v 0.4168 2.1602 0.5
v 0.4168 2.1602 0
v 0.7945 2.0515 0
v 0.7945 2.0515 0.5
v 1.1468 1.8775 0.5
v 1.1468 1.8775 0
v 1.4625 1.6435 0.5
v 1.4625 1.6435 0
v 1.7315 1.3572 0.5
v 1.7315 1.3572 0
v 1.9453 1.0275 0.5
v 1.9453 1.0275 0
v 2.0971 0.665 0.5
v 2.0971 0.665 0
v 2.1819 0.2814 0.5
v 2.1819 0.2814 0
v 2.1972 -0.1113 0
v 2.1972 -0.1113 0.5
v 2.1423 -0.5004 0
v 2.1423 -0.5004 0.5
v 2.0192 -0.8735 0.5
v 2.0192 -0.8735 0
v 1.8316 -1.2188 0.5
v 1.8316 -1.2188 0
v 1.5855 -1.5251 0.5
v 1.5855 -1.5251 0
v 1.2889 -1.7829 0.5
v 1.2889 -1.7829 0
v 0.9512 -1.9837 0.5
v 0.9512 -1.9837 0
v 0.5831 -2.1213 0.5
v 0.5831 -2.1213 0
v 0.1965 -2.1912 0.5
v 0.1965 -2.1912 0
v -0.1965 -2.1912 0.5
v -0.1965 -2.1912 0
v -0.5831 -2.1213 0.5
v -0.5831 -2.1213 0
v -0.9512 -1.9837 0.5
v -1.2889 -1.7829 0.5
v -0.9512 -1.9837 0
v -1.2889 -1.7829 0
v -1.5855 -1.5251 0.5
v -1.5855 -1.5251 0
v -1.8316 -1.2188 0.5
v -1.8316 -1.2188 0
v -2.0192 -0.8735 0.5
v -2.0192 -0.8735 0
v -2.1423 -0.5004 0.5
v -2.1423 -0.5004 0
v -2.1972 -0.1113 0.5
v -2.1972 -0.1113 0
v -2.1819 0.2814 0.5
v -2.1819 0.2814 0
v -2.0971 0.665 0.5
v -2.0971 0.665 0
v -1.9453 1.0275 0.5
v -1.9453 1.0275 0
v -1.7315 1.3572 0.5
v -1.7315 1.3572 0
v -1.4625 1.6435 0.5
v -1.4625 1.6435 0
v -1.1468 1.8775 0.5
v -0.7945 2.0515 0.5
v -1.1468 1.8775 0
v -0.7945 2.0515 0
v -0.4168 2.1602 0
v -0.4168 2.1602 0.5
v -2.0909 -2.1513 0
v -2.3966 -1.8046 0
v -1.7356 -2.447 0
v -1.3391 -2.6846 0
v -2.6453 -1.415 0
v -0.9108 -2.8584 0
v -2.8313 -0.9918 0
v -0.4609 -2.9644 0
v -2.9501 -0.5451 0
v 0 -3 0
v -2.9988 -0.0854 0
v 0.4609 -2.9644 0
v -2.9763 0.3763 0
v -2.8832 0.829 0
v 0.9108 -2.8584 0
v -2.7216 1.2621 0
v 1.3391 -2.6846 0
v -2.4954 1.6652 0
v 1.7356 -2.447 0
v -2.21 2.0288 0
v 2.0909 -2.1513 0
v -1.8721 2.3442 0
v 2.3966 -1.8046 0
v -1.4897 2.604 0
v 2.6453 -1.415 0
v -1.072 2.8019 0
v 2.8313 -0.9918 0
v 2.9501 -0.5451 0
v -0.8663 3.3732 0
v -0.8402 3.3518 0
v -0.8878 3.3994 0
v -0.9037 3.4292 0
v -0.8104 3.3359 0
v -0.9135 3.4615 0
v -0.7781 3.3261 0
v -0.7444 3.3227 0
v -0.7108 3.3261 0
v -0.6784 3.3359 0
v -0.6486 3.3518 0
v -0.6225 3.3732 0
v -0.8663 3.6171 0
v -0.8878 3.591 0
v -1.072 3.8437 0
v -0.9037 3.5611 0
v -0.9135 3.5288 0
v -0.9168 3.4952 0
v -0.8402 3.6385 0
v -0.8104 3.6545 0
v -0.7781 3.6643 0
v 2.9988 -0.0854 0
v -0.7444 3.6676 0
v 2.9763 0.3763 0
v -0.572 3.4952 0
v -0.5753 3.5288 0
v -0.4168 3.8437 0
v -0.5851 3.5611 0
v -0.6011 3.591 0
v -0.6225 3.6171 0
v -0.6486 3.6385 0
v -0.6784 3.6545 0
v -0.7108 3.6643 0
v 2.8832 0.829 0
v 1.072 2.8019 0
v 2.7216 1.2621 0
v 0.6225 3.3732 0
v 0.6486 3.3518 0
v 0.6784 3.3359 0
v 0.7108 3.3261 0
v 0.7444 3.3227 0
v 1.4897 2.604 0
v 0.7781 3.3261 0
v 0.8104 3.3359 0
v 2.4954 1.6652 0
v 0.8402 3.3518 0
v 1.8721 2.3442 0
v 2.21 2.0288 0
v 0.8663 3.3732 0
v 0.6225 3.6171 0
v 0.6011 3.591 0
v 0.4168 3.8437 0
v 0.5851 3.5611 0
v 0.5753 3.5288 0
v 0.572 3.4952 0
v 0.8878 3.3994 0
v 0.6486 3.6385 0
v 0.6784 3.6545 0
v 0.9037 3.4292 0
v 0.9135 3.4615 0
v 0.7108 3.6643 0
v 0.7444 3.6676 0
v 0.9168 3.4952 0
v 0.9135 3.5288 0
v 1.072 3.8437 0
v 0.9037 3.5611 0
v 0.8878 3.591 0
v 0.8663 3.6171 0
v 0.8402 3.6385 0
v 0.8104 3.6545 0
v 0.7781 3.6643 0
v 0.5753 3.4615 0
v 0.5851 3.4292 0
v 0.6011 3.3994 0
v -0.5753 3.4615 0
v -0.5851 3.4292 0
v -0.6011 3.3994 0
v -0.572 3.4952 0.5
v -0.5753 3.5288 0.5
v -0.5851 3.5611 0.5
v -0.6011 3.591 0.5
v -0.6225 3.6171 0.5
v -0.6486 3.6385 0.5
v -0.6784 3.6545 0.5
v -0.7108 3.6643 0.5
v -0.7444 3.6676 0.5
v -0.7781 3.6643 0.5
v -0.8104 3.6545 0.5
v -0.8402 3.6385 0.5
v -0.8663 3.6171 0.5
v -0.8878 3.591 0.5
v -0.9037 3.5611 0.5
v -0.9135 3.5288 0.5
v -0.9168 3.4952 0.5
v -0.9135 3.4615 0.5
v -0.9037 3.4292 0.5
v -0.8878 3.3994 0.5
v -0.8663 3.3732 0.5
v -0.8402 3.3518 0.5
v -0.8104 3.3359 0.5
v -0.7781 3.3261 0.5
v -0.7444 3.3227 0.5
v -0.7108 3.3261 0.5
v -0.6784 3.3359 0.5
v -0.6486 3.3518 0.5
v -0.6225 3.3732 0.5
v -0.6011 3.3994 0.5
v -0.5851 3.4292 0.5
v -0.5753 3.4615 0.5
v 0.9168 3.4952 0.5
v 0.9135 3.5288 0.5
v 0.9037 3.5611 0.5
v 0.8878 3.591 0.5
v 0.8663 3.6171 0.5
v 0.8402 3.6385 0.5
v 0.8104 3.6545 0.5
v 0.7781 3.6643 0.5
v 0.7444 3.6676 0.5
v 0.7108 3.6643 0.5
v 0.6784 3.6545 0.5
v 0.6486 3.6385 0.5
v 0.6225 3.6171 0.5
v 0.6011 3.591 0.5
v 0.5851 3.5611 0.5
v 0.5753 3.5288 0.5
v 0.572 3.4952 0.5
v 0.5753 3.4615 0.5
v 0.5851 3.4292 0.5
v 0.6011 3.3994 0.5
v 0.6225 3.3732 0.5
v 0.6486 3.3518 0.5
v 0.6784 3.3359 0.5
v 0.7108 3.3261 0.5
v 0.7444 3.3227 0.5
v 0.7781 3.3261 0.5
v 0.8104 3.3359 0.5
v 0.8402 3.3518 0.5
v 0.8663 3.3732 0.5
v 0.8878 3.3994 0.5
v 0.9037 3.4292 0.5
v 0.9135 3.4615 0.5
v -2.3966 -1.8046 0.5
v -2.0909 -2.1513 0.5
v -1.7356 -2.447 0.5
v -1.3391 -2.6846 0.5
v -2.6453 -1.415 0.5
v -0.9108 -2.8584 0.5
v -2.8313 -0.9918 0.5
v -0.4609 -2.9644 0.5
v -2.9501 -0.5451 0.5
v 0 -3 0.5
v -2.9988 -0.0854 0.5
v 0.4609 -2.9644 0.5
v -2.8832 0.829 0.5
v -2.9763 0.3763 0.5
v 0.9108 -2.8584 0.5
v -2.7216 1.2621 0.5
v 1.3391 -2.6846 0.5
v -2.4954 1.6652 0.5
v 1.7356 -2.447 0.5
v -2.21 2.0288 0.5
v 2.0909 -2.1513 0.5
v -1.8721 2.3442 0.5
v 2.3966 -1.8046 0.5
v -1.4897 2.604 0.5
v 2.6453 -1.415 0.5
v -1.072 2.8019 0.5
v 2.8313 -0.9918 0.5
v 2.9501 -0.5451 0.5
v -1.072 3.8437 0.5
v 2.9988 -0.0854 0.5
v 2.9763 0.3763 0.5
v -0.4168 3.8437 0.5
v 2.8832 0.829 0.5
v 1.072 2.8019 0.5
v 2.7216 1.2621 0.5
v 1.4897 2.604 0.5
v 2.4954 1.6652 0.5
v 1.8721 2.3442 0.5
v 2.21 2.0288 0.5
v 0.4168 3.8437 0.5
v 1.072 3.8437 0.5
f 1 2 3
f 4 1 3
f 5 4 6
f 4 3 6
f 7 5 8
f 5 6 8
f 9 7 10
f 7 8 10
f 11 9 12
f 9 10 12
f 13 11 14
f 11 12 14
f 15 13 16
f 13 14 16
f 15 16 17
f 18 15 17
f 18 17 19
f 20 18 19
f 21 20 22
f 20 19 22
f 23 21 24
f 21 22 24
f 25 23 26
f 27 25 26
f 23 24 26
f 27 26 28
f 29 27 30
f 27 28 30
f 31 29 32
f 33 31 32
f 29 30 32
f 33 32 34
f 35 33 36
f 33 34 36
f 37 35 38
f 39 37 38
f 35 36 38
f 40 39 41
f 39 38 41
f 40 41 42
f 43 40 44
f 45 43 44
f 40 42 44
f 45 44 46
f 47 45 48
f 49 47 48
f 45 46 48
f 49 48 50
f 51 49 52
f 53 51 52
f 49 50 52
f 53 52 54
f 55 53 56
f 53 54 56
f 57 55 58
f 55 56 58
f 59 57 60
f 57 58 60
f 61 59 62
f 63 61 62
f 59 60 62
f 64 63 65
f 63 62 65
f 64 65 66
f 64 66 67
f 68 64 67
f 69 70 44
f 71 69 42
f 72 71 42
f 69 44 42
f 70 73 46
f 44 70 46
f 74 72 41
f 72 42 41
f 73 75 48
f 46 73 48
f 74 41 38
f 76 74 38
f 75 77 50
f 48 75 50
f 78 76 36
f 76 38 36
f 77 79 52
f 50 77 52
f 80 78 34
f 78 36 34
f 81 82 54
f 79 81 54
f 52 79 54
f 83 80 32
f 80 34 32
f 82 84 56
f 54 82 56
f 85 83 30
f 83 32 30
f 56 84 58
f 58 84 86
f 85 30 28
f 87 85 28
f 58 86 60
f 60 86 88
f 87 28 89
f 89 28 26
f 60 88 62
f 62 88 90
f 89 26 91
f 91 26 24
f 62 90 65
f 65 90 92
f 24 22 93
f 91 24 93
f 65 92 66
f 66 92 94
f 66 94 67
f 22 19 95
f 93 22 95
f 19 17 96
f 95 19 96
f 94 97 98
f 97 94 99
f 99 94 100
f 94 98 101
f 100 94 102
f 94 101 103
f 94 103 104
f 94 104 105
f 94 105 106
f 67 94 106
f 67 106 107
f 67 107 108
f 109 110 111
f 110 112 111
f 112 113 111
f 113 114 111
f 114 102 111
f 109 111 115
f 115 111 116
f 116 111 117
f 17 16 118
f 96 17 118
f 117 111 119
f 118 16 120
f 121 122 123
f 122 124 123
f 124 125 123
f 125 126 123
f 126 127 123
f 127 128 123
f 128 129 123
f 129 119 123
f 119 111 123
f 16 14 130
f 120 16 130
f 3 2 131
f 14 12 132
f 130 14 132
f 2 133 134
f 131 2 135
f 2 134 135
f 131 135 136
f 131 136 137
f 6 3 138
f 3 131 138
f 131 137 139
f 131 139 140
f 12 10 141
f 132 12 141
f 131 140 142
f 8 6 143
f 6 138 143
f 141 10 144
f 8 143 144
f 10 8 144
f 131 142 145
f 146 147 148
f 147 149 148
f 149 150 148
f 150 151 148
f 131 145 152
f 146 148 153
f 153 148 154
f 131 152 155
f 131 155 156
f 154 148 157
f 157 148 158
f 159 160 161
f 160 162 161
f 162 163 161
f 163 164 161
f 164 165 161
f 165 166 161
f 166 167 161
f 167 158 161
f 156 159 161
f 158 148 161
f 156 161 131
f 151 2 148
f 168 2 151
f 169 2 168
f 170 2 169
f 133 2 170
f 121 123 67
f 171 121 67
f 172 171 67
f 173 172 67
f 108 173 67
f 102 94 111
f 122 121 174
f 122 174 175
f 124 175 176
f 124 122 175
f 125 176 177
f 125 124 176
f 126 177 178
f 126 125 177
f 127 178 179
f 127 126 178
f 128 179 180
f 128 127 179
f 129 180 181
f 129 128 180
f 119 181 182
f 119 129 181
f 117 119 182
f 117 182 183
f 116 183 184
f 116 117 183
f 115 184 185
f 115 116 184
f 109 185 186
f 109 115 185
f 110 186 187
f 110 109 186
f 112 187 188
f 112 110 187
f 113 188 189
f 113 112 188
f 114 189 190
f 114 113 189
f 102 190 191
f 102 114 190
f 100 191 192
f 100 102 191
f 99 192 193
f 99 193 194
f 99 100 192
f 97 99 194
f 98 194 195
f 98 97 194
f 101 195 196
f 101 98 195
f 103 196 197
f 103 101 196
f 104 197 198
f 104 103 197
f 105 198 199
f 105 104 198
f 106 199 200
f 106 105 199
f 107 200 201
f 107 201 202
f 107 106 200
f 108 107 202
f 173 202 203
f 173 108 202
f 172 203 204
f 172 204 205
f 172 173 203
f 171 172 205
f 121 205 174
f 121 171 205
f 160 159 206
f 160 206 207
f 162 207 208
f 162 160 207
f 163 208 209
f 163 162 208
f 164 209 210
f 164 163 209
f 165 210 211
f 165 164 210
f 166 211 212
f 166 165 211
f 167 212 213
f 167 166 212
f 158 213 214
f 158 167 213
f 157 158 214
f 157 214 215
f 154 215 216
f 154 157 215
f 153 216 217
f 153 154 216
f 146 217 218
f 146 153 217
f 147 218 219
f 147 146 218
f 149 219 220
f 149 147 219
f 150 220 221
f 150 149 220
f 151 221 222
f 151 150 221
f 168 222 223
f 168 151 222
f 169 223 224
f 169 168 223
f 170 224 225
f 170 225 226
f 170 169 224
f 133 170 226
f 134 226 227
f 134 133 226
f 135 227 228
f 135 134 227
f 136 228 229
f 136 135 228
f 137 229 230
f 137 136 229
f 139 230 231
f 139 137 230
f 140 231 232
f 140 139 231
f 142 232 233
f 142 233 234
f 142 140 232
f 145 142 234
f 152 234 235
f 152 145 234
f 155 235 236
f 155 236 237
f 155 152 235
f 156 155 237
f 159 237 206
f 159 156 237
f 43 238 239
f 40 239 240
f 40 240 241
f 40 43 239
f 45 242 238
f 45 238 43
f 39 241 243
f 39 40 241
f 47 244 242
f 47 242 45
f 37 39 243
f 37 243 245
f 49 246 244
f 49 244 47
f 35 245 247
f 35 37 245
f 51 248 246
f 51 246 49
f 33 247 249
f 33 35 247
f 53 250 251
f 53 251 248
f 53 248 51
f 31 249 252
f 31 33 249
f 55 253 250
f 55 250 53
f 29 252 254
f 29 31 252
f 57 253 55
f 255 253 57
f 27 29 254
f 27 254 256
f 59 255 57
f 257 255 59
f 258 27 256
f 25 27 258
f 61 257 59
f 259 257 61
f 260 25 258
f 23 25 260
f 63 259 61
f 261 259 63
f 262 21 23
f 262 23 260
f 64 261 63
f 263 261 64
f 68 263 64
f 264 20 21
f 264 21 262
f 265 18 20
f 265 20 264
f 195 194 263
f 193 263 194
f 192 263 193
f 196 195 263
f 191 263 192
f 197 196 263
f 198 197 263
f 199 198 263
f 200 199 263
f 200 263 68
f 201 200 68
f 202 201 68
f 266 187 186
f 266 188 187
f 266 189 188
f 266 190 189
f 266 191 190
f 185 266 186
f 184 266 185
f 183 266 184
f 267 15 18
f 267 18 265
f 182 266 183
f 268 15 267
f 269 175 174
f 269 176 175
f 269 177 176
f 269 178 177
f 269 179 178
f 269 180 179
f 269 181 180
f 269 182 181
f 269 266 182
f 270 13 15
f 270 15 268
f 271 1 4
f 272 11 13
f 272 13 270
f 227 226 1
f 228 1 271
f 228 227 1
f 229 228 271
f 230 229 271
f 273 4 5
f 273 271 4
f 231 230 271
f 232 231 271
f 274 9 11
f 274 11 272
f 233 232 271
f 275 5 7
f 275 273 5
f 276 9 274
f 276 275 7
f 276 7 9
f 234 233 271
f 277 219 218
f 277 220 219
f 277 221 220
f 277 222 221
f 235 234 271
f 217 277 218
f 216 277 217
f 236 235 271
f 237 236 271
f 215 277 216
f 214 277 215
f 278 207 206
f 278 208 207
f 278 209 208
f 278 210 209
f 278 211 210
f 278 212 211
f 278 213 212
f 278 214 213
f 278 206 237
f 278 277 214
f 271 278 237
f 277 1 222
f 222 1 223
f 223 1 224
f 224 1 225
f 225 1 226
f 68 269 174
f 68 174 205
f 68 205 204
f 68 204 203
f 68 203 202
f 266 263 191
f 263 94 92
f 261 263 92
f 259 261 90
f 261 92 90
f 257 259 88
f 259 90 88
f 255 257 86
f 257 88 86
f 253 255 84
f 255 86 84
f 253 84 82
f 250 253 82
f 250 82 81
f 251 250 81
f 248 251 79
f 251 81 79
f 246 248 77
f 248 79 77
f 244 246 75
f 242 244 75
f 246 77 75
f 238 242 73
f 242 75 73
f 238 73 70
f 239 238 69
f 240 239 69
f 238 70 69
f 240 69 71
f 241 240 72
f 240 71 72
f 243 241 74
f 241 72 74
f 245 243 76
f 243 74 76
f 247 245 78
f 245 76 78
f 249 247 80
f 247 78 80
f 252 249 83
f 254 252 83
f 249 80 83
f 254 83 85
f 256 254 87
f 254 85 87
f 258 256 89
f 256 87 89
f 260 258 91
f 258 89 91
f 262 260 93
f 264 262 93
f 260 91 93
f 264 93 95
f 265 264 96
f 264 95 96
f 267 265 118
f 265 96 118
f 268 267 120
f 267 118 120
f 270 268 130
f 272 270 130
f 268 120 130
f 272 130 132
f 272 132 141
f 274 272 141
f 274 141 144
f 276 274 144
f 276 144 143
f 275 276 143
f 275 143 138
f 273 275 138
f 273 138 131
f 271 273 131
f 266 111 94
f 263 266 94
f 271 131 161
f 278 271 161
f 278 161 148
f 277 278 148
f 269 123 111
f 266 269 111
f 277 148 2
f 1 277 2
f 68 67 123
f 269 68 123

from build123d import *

# Parameters (mm, degrees)
SZKIC1_R                    = 0.172416741
DODANIE_WYCI_GNI_CIE1_DEPTH = 0.5


with BuildPart() as part:
    # Szkic1 → Dodanie-wyciągnięcie1 (new body)
    with BuildSketch(Plane.XY):
        with BuildLine():
            Line((1.072016687, 2.801924379), (1.072016687, 3.843679809))
            Line((1.072016687, 3.843679809), (0.416833072, 3.843679809))
            Line((0.416833072, 3.843679809), (0.416833072, 2.160150502))
            ThreePointArc((0.416833072, 2.160150502), (0, -2.2), (-0.416833072, 2.160150502))
            Line((-0.416833072, 2.160150502), (-0.416833072, 3.843679809))
            Line((-0.416833072, 3.843679809), (-1.072016687, 3.843679809))
            Line((-1.072016687, 3.843679809), (-1.072016687, 2.801924379))
            ThreePointArc((-1.072016687, 2.801924379), (0, -3), (1.072016687, 2.801924379))
        make_face()
        with Locations((0.74442488, 3.495160541)):
            Circle(SZKIC1_R, mode=Mode.SUBTRACT)
        with Locations((-0.74442488, 3.495160541)):
            Circle(SZKIC1_R, mode=Mode.SUBTRACT)
    extrude(amount=DODANIE_WYCI_GNI_CIE1_DEPTH)


solid = part.part
